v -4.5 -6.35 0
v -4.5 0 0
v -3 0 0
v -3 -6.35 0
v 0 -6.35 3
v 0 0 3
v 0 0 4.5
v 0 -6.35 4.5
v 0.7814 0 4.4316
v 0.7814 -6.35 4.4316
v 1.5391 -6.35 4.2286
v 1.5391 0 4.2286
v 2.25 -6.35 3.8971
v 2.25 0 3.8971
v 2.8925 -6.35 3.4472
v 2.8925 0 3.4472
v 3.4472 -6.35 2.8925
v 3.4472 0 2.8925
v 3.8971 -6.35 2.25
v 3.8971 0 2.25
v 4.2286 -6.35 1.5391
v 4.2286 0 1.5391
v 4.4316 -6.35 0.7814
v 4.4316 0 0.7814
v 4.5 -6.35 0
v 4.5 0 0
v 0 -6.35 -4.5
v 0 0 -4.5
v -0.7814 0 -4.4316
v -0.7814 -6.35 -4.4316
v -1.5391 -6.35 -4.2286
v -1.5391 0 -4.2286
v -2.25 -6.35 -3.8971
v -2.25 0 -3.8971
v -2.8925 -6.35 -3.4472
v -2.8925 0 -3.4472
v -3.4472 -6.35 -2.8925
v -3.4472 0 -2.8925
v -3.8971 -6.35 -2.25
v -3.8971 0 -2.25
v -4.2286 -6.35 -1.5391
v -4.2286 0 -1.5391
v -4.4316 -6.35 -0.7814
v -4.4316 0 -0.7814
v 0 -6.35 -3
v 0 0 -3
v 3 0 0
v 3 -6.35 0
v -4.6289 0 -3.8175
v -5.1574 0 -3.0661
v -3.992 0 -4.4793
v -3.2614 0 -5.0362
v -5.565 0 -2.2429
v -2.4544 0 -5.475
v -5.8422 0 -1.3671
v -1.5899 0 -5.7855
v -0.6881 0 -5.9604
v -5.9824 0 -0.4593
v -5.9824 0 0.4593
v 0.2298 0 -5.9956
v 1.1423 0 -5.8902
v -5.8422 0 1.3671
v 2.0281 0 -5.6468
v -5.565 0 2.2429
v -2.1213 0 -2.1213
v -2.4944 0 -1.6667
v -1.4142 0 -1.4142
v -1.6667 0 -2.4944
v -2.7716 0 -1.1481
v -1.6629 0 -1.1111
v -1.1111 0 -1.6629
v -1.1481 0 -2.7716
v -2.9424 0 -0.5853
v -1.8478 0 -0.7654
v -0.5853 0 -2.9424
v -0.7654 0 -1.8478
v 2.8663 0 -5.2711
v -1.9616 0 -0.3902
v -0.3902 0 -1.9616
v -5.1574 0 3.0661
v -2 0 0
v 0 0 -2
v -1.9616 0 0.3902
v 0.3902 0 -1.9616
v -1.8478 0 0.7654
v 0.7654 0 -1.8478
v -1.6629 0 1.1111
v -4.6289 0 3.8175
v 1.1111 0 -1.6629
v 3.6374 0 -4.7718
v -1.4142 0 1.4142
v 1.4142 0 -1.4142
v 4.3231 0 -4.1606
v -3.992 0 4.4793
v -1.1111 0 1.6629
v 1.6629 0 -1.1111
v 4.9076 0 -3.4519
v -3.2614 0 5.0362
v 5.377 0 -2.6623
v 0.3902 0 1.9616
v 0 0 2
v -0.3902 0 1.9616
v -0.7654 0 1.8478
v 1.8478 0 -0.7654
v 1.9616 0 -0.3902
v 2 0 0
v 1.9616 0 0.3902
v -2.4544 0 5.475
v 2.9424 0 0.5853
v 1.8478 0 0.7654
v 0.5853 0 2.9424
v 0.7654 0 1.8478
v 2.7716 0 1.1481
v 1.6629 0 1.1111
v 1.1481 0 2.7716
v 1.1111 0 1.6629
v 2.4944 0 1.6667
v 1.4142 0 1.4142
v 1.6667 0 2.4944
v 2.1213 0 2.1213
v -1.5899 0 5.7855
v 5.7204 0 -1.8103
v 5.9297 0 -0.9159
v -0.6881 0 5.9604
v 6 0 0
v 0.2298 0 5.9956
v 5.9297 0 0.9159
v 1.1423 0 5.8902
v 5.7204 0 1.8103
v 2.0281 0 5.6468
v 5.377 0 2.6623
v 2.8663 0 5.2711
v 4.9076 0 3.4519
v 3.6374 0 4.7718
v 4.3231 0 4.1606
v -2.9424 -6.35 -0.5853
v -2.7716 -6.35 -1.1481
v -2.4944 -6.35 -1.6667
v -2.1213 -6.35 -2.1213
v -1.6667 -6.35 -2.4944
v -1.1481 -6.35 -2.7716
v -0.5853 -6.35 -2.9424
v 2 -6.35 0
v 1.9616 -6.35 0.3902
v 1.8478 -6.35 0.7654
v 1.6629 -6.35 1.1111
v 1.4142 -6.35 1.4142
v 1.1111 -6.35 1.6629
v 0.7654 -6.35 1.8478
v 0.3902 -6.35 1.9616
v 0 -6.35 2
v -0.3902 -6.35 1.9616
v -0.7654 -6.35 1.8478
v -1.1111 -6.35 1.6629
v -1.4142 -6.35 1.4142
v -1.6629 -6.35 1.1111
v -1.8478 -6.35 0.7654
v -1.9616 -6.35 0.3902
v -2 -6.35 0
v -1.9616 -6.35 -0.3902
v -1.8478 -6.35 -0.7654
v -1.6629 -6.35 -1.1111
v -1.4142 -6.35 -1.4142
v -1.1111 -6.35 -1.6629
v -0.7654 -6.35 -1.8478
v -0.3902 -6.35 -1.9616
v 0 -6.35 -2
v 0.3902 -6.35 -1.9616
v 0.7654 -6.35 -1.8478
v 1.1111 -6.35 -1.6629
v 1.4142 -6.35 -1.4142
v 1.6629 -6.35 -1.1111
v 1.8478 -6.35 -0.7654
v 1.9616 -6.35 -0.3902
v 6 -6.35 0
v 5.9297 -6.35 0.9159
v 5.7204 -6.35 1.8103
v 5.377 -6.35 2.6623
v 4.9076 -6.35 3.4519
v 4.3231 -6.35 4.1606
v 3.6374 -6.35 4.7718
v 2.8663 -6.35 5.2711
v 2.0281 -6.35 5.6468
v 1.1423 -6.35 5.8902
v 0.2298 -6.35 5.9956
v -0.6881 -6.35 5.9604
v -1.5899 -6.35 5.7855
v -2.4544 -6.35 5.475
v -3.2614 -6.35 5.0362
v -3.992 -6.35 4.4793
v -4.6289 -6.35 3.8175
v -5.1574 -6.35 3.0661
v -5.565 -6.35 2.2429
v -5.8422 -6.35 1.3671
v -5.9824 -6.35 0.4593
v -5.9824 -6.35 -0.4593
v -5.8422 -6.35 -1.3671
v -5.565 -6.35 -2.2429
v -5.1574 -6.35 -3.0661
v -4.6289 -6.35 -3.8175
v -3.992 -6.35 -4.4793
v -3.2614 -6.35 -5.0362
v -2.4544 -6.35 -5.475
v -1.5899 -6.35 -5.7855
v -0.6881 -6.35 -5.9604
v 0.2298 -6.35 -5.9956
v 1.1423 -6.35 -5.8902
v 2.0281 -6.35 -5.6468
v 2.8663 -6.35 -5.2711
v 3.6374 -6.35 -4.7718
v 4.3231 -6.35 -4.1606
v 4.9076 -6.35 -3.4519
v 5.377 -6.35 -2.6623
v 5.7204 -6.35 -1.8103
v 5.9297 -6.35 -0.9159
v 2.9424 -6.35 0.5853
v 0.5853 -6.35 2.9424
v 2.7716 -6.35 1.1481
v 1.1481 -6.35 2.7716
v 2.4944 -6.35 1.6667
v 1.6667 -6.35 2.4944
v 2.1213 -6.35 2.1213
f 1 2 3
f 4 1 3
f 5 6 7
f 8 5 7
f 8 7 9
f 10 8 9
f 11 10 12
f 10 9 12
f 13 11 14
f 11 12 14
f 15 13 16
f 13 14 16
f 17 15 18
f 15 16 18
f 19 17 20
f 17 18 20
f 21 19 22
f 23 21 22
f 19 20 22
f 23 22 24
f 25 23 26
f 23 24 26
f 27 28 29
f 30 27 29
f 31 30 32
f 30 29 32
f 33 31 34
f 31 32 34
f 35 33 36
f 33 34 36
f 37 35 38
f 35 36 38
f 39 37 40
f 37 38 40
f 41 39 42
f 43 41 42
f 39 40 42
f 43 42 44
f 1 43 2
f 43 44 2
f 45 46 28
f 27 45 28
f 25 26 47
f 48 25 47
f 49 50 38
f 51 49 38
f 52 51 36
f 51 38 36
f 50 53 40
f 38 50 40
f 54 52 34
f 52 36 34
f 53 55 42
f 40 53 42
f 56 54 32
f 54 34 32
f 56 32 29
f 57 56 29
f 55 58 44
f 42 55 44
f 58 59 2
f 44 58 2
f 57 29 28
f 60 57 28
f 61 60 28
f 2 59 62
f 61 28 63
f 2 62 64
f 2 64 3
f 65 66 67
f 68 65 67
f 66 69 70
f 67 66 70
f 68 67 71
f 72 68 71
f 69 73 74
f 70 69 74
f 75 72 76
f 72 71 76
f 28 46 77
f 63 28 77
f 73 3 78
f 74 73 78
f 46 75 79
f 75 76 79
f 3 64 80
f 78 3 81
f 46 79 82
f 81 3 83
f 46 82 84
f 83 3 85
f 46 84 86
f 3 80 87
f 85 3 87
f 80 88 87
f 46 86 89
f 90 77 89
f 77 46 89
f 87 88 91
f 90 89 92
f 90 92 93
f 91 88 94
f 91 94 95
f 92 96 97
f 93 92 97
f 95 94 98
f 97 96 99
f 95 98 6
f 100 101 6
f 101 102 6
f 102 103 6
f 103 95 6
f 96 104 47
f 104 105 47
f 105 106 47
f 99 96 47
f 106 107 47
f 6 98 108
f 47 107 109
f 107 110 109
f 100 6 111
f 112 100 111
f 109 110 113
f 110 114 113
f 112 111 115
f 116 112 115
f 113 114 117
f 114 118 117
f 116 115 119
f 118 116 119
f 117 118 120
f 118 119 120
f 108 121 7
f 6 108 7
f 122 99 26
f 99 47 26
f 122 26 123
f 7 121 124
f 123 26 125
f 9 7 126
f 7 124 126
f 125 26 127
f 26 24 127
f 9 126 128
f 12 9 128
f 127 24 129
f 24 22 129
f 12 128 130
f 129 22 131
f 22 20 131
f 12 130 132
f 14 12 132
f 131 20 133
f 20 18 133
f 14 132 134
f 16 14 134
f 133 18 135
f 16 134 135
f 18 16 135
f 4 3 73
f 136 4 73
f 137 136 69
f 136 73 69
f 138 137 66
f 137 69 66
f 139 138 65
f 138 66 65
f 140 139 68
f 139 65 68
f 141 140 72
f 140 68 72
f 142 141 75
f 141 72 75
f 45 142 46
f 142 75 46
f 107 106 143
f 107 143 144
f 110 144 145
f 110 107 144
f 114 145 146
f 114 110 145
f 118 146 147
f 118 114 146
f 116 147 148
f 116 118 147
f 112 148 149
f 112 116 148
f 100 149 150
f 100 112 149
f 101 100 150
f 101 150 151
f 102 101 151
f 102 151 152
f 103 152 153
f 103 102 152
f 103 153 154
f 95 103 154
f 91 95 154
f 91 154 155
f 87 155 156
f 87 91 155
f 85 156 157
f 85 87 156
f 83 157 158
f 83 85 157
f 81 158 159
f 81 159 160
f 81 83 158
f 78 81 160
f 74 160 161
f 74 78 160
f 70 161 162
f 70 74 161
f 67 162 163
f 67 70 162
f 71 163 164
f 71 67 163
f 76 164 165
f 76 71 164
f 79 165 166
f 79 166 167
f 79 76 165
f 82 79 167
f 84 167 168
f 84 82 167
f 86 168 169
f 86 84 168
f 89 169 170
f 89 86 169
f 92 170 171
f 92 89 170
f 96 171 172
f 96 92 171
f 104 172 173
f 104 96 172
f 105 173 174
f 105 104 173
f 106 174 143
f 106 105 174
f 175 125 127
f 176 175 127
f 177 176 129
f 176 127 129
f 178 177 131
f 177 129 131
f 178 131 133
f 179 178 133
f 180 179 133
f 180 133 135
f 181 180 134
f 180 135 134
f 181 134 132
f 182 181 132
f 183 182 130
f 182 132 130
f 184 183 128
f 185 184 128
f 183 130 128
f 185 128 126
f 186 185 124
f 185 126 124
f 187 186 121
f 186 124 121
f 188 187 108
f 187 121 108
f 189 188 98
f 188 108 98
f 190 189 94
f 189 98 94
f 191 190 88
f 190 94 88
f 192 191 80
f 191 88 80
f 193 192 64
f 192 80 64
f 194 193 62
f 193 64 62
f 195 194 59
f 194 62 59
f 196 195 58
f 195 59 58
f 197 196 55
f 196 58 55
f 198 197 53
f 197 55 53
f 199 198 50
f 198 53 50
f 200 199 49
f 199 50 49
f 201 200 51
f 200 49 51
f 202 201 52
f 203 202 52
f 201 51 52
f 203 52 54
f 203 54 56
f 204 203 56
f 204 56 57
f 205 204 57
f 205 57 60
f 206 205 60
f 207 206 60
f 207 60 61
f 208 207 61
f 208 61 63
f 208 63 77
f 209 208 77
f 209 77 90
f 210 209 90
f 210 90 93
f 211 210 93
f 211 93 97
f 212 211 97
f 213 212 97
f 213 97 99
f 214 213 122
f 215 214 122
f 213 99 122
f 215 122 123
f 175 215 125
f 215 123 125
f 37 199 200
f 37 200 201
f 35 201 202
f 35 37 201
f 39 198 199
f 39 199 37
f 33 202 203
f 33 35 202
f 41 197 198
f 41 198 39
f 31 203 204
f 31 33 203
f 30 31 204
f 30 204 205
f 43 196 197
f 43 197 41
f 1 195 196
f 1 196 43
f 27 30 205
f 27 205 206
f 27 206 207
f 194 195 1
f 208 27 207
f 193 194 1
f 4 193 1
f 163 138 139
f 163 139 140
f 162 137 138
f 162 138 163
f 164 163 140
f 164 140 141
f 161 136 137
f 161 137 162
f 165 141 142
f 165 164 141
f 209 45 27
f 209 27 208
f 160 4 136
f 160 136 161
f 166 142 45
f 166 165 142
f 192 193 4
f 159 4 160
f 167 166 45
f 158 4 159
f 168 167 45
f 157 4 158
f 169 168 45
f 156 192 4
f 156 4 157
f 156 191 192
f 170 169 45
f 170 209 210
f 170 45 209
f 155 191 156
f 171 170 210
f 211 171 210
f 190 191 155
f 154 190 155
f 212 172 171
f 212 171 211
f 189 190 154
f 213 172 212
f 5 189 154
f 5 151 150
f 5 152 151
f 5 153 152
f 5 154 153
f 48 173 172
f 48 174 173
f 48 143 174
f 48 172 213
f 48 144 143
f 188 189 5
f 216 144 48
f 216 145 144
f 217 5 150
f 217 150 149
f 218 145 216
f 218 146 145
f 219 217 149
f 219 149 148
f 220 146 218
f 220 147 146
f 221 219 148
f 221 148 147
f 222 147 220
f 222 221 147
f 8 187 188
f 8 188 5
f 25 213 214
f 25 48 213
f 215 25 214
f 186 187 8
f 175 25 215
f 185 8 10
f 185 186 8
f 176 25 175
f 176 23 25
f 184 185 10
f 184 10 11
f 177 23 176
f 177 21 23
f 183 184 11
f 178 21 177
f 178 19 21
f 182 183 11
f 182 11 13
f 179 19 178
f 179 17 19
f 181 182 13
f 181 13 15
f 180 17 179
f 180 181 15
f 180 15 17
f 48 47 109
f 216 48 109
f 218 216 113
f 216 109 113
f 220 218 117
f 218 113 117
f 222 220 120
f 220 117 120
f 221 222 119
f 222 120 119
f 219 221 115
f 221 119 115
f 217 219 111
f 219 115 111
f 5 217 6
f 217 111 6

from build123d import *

# Parameters (mm, degrees)
F0_R     = 6
F0_R_2   = 2
F1_DEPTH = 6.35


# Not quite as in the source:
# - a length typed as a fraction of an inch, garbled in the dataset ("3 / 203.2 mm" for 3/8 in), is restored


with BuildPart() as f1:
    # F0 (on Front) → F1 (new body)
    with BuildSketch(Plane.XZ):
        Circle(F0_R)
        with BuildLine():
            ThreePointArc((0, 4.5), (3.1819805153, 3.1819805153), (4.5, 0))
            ThreePointArc((4.5, 0), (3.1819805153, -3.1819805153), (0, -4.5))
            ThreePointArc((0, -4.5), (-3.1819805153, -3.1819805153), (-4.5, 0))
            ThreePointArc((-4.5, 0), (-3.1819805153, 3.1819805153), (0, 4.5))
        make_face(mode=Mode.SUBTRACT)
        with BuildLine():
            ThreePointArc((0, -4.5), (3.1819805153, -3.1819805153), (4.5, 0))
            Line((4.5, 0), (3, 0))
            ThreePointArc((3, 0), (2.1213203436, -2.1213203436), (0, -3))
            Line((0, -3), (0, -4.5))
        make_face()
        with BuildLine():
            ThreePointArc((0, -3), (2.1213203436, -2.1213203436), (3, 0))
            ThreePointArc((3, 0), (2.1213203436, 2.1213203436), (0, 3))
            ThreePointArc((0, 3), (-2.1213203436, 2.1213203436), (-3, 0))
            ThreePointArc((-3, 0), (-2.1213203436, -2.1213203436), (0, -3))
        make_face()
        Circle(F0_R_2, mode=Mode.SUBTRACT)
        with BuildLine():
            Line((0, 3), (0, 4.5))
            ThreePointArc((0, 4.5), (-3.1819805153, 3.1819805153), (-4.5, 0))
            Line((-4.5, 0), (-3, 0))
            ThreePointArc((-3, 0), (-2.1213203436, 2.1213203436), (0, 3))
        make_face()
    extrude(amount=F1_DEPTH)


solid = f1.part
